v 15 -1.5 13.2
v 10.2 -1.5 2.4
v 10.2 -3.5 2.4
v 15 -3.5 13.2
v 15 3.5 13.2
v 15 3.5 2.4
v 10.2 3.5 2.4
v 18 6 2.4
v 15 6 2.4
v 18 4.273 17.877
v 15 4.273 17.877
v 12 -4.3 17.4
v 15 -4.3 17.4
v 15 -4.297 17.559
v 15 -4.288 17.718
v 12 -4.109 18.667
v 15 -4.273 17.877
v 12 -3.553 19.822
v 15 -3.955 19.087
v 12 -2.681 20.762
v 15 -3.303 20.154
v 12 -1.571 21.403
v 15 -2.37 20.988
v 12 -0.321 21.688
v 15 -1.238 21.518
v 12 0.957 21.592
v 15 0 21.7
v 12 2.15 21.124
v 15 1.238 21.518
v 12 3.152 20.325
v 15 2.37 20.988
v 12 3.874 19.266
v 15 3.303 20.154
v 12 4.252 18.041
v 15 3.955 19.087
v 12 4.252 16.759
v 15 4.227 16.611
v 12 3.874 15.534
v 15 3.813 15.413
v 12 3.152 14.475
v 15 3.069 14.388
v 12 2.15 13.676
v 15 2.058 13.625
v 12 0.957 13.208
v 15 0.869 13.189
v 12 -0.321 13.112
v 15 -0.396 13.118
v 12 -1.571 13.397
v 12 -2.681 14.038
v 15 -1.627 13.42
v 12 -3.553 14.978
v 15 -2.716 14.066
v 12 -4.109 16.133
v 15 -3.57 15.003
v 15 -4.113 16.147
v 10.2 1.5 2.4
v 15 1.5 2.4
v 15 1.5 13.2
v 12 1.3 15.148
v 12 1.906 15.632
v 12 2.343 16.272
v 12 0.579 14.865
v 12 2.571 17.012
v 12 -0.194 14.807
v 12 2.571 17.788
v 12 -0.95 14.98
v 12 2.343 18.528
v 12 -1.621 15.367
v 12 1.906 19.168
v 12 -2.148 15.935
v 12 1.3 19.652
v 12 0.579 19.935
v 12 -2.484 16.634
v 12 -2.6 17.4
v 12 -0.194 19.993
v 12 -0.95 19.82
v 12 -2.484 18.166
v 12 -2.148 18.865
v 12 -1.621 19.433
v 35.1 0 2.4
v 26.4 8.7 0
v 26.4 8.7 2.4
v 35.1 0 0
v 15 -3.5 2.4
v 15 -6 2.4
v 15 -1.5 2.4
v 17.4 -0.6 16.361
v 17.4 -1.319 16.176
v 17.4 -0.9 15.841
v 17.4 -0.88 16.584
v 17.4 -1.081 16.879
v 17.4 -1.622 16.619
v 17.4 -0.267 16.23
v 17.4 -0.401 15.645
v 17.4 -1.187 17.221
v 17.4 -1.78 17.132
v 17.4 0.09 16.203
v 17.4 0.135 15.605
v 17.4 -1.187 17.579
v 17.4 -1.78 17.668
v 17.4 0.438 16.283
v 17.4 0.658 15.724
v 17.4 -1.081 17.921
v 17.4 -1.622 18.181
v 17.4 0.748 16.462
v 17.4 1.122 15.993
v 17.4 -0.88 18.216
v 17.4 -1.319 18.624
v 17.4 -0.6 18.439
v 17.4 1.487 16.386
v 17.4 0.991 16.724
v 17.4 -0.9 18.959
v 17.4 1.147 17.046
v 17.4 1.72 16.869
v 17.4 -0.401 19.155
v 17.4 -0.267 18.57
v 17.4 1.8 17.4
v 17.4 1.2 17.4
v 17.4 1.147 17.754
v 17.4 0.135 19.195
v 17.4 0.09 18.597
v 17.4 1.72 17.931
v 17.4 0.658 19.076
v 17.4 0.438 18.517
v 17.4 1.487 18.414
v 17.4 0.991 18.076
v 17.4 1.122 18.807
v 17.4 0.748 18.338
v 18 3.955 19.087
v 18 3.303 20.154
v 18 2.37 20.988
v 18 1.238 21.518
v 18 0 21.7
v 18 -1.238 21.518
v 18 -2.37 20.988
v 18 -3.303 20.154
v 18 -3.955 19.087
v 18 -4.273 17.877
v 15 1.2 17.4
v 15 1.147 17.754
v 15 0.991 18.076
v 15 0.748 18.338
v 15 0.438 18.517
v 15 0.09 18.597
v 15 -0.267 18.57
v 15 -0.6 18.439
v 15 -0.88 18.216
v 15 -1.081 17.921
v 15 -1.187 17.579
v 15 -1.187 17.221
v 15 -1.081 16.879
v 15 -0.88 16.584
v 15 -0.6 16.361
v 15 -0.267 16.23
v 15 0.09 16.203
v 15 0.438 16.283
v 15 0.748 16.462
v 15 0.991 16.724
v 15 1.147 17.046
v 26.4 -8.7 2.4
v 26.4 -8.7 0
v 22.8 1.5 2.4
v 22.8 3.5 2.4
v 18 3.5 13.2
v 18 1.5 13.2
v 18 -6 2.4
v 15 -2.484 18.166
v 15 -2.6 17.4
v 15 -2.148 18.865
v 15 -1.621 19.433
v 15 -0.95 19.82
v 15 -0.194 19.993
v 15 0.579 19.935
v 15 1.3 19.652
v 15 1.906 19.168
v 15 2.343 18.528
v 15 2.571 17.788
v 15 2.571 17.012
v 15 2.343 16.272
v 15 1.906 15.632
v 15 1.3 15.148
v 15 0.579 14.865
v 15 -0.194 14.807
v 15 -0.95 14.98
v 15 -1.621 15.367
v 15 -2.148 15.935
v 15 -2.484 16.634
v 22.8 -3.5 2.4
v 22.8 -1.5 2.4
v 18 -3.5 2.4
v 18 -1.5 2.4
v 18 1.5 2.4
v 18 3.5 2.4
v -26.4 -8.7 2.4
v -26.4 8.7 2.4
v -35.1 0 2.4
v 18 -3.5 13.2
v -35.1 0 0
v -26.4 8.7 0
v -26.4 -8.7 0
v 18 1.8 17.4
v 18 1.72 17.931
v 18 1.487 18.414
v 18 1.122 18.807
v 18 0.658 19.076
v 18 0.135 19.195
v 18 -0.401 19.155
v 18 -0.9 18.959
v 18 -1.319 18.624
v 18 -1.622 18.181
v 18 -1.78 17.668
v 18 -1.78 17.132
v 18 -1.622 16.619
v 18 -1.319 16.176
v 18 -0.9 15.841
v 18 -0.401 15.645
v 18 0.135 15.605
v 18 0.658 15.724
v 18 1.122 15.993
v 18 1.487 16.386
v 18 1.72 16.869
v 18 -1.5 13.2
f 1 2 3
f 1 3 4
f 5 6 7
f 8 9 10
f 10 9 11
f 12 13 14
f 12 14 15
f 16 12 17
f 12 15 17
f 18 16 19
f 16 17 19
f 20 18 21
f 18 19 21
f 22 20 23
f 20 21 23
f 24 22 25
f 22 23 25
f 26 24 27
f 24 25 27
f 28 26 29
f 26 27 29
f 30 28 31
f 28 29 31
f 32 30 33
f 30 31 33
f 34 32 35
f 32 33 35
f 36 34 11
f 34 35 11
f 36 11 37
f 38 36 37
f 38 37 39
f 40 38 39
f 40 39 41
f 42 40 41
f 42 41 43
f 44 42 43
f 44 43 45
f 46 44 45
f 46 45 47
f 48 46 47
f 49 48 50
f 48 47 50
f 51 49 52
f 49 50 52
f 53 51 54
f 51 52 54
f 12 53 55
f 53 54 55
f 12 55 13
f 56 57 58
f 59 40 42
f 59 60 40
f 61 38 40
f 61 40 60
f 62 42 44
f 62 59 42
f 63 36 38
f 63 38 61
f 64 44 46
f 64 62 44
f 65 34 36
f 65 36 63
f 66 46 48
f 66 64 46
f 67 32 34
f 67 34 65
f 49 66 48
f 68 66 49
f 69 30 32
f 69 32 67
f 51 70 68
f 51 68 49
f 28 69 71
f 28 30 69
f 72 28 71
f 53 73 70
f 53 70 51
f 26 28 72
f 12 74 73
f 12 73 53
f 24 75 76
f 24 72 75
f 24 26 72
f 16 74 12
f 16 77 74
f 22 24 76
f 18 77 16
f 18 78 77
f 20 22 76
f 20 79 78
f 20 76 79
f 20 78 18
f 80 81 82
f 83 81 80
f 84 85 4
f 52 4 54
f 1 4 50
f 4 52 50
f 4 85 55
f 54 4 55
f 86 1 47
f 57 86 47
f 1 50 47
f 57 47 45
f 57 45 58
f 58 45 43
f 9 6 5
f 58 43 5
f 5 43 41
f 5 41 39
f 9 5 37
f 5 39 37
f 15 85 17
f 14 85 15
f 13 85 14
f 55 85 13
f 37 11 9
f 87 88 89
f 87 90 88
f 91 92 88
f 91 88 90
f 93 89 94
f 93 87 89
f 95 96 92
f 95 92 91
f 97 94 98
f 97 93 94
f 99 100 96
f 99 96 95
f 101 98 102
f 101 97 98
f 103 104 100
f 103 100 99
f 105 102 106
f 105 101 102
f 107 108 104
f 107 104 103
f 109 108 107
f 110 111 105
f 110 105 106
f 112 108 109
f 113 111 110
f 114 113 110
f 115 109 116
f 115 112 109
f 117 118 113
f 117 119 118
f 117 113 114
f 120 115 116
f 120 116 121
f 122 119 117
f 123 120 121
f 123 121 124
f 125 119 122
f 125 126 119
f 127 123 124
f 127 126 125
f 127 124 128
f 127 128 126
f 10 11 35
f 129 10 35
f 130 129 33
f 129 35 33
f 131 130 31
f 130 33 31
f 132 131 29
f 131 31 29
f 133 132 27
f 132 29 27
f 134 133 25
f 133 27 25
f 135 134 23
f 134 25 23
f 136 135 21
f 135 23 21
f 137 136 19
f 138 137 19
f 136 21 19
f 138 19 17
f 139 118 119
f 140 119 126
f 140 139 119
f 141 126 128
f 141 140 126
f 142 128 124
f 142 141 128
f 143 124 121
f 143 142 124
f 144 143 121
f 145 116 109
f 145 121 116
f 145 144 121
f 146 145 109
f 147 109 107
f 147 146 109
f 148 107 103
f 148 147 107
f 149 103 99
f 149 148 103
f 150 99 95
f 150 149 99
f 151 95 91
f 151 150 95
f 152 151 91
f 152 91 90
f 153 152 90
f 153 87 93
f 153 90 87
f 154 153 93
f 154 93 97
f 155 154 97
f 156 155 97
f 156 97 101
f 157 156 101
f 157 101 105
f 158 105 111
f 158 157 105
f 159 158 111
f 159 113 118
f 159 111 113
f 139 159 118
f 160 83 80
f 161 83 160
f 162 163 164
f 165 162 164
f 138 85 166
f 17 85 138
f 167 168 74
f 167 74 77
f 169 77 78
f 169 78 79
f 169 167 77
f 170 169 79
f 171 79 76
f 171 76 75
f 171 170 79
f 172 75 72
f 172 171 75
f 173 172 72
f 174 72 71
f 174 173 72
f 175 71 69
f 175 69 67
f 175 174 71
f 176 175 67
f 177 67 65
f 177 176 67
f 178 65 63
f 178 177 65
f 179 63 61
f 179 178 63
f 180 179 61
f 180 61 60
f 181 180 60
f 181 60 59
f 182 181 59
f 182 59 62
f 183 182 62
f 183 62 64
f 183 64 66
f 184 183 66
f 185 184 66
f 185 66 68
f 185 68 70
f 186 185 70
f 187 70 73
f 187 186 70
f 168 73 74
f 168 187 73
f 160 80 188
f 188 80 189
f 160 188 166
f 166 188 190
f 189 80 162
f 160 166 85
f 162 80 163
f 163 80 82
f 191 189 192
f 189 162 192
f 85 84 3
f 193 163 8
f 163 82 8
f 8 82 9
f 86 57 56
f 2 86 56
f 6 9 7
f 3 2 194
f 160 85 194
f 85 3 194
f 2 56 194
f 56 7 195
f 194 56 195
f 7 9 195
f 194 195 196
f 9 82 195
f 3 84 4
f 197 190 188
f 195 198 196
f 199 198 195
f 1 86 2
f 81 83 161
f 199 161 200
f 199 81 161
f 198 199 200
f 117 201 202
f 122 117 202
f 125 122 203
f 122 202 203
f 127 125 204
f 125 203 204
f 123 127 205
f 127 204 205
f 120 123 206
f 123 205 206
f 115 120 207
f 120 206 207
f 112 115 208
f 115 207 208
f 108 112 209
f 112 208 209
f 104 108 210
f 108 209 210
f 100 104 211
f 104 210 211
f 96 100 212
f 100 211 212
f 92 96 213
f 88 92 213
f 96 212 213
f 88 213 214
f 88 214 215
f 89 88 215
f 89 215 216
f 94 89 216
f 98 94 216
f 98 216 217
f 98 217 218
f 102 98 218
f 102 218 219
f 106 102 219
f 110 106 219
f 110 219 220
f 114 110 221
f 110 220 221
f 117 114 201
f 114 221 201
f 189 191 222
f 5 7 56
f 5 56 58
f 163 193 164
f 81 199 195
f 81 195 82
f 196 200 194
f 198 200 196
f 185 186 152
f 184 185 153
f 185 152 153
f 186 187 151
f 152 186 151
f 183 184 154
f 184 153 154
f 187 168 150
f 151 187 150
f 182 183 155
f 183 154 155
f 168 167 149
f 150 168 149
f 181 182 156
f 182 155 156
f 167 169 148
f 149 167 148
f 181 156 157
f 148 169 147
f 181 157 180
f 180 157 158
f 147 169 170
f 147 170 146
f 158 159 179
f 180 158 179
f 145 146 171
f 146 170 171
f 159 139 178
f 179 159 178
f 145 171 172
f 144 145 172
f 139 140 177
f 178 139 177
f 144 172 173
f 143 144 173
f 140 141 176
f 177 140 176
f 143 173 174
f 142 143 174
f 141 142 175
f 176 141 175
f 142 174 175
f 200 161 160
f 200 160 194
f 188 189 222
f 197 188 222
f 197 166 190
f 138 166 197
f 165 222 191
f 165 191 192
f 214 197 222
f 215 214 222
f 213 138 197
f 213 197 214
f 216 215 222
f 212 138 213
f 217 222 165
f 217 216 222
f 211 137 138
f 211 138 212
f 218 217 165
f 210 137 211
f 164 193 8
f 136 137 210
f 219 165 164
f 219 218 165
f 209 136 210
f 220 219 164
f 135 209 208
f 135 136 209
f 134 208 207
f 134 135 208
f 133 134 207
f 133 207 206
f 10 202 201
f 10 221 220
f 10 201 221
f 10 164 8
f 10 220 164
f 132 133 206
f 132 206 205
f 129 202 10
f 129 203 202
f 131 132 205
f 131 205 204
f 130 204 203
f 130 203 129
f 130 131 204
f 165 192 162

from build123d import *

# Parameters (mm, degrees)
PAD_DEPTH           = 2.4
SKETCH002_R         = 1.2
PAD001_DEPTH        = 3
SKETCH003_R         = 4.3
SKETCH003_R_2       = 2.6
PAD002_DEPTH        = 3
PAD003_DEPTH        = 2
LINEARPATTERN_COUNT = 2
LINEARPATTERN_PITCH = 5
SKETCH006_R         = 1.8
POCKET_DEPTH        = 0.6


with BuildPart() as part:
    # Sketch → Pad (new body)
    with BuildSketch(Plane.XY):
        Polygon((-26.4, 8.7), (26.4, 8.7), (35.1, 0), (26.4, -8.7), (-26.4, -8.7), (-35.1, 0), align=None)
    extrude(amount=PAD_DEPTH)

    # Sketch002 → Pad001 (join)
    with BuildSketch(Plane.YZ.offset(15)):
        with BuildLine():
            Line((-6, 2.4), (6, 2.4))
            Line((6, 2.4), (4.2734913846, 17.8767298872))
            ThreePointArc((4.2734913846, 17.8767298872), (0, 21.7), (-4.2734913846, 17.8767298872))
            Line((-6, 2.4), (-4.2734913846, 17.8767298872))
        make_face()
        with Locations((0, 17.4)):
            Circle(SKETCH002_R, mode=Mode.SUBTRACT)
    extrude(amount=PAD001_DEPTH)

    # Sketch003 (on Face12 of Pad001) → Pad002 (join)
    with BuildSketch(Plane(origin=(15, 0, 0), x_dir=(0, -1, 0), z_dir=(-1, 0, 0))):
        with Locations((0, 17.4)):
            Circle(SKETCH003_R)
        with Locations((0, 17.4)):
            Circle(SKETCH003_R_2, mode=Mode.SUBTRACT)
    extrude(amount=PAD002_DEPTH)

    # Sketch005 → Pad003 (join)
    with BuildSketch(Plane.XZ.offset(1.5)):
        Polygon((10.2, 2.4), (15, 13.2), (15, 2.4), align=None)
        Polygon((18, 13.2), (18, 2.4), (22.8, 2.4), align=None)
    pad003 = extrude(amount=PAD003_DEPTH)

    # LinearPattern: Pad003 ×2
    with Locations(*[(0, i * LINEARPATTERN_PITCH, 0) for i in range(1, LINEARPATTERN_COUNT)]):
        add(pad003)

    # Sketch006 (on Face10 of LinearPattern) → Pocket (cut)
    with BuildSketch(Plane.YZ.offset(18)):
        with Locations((0, 17.4)):
            Circle(SKETCH006_R)
    extrude(amount=-POCKET_DEPTH, mode=Mode.SUBTRACT)


solid = part.part
